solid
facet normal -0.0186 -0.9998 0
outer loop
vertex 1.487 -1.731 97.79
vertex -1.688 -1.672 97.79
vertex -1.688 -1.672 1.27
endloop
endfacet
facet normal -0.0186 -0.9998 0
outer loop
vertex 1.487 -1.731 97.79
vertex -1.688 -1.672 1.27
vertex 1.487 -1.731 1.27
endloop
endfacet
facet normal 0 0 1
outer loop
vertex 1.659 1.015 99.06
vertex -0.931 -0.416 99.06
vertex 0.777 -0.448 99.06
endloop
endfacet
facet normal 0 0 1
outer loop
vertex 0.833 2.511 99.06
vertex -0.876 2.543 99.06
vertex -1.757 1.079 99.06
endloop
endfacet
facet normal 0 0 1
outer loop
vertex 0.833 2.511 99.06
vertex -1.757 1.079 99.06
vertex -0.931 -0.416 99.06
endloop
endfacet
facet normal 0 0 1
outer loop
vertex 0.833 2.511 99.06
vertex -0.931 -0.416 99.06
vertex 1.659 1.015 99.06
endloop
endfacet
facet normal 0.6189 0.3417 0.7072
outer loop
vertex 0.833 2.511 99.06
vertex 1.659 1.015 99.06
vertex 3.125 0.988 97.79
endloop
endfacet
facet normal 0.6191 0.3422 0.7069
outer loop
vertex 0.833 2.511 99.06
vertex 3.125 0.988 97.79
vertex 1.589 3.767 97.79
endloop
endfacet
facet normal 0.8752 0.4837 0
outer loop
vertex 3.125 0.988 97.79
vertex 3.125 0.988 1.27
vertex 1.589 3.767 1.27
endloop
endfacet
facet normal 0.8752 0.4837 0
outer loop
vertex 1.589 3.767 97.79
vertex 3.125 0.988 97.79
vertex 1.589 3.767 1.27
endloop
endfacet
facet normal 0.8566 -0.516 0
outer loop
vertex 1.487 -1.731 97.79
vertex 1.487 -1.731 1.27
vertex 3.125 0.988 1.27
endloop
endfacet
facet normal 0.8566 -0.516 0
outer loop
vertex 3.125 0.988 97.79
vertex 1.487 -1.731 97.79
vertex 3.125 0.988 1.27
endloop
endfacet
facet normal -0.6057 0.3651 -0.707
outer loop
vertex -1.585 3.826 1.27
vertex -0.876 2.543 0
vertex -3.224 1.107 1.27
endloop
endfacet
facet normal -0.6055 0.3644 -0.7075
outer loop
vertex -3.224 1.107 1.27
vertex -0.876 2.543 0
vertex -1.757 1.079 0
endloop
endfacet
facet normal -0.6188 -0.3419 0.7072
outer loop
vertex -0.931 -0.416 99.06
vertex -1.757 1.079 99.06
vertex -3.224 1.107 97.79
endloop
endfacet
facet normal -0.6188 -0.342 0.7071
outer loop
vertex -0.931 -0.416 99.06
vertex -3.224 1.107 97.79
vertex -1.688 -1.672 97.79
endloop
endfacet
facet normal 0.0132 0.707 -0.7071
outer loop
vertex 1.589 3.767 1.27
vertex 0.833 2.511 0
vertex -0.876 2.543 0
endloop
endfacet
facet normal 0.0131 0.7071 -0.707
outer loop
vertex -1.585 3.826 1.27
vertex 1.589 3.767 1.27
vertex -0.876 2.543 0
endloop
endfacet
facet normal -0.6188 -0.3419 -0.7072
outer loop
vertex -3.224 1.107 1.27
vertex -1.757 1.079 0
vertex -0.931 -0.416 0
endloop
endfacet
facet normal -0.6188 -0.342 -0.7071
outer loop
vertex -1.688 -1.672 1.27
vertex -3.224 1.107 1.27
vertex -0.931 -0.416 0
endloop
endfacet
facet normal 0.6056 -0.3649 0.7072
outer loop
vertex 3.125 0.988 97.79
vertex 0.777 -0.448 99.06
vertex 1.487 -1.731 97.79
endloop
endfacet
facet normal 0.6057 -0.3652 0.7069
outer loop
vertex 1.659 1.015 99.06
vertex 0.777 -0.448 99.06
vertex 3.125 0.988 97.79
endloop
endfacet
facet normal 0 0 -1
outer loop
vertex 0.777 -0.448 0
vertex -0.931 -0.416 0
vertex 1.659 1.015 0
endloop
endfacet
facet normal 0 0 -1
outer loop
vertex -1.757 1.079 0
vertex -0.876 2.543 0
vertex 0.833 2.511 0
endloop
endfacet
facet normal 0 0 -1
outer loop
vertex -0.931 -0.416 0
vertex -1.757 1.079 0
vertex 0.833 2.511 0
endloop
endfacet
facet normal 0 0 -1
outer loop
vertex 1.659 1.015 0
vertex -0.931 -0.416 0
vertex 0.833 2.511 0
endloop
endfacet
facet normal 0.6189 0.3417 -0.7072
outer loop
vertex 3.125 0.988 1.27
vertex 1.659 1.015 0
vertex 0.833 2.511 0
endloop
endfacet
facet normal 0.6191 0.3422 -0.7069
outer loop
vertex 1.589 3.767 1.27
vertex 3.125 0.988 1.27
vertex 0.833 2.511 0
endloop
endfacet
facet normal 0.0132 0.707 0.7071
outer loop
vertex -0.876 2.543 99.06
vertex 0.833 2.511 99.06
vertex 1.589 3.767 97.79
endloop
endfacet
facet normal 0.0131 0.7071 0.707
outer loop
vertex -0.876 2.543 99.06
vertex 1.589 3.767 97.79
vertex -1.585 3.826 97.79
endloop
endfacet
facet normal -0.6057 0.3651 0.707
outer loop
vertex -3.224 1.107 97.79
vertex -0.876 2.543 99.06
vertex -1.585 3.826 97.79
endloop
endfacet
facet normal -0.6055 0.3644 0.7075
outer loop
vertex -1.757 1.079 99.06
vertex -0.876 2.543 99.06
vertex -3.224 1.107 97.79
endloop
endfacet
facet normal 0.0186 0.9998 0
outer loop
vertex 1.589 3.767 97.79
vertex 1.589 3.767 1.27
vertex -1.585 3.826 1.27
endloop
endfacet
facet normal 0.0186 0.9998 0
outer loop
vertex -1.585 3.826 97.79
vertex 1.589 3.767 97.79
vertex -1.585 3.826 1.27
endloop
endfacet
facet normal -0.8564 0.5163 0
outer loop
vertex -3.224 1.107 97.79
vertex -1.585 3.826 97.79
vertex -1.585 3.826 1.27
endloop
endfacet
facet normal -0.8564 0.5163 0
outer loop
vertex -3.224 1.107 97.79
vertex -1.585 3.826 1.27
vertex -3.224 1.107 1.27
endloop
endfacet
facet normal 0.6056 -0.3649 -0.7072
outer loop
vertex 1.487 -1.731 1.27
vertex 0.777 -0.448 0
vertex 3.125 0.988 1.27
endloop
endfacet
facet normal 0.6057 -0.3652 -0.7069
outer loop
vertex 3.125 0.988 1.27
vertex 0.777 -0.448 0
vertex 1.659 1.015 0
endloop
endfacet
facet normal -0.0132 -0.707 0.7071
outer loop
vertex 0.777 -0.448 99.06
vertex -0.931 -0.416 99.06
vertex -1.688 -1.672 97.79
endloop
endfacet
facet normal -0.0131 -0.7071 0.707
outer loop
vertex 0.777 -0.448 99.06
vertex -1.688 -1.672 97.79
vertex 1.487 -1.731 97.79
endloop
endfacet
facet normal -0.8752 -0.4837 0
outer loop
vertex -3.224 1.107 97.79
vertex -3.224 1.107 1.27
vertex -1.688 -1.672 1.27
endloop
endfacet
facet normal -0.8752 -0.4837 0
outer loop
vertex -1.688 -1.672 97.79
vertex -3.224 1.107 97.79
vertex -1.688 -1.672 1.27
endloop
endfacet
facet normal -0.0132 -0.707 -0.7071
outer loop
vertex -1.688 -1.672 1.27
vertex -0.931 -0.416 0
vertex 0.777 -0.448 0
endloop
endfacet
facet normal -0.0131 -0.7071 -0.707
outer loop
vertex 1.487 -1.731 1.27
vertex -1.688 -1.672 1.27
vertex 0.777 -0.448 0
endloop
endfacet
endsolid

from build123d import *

# Parameters (mm, degrees)
F1_DEPTH = 99.06
F2_SIZE  = 1.27


with BuildPart() as f1:
    # F0 (on Top) → F1 (new body)
    with BuildSketch(Plane.XY):
        Polygon((-3.223582, 1.106647), (-1.687731, -1.672163), (1.486715, -1.731482), (3.125309, 0.988009), (1.589458, 3.766819), (-1.584988, 3.826138), align=None)
    extrude(amount=F1_DEPTH)

    # F2
    f2_edges = [f1.edges().sort_by_distance(p)[0] for p in [
        (-2.404285, 2.466393, 0),
        (-2.455657, -0.282758, 0),
        (-0.100508, -1.701823, 0),
        (2.306012, -0.371737, 0),
        (2.357384, 2.377414, 0),
        (0.002235, 3.796479, 0),
        (-2.404285, 2.466393, 99.06),
        (-2.455657, -0.282758, 99.06),
        (-0.100508, -1.701823, 99.06),
        (2.306012, -0.371737, 99.06),
        (2.357384, 2.377414, 99.06),
        (0.002235, 3.796479, 99.06),
    ]]
    chamfer(f2_edges, length=F2_SIZE)


solid = f1.part
